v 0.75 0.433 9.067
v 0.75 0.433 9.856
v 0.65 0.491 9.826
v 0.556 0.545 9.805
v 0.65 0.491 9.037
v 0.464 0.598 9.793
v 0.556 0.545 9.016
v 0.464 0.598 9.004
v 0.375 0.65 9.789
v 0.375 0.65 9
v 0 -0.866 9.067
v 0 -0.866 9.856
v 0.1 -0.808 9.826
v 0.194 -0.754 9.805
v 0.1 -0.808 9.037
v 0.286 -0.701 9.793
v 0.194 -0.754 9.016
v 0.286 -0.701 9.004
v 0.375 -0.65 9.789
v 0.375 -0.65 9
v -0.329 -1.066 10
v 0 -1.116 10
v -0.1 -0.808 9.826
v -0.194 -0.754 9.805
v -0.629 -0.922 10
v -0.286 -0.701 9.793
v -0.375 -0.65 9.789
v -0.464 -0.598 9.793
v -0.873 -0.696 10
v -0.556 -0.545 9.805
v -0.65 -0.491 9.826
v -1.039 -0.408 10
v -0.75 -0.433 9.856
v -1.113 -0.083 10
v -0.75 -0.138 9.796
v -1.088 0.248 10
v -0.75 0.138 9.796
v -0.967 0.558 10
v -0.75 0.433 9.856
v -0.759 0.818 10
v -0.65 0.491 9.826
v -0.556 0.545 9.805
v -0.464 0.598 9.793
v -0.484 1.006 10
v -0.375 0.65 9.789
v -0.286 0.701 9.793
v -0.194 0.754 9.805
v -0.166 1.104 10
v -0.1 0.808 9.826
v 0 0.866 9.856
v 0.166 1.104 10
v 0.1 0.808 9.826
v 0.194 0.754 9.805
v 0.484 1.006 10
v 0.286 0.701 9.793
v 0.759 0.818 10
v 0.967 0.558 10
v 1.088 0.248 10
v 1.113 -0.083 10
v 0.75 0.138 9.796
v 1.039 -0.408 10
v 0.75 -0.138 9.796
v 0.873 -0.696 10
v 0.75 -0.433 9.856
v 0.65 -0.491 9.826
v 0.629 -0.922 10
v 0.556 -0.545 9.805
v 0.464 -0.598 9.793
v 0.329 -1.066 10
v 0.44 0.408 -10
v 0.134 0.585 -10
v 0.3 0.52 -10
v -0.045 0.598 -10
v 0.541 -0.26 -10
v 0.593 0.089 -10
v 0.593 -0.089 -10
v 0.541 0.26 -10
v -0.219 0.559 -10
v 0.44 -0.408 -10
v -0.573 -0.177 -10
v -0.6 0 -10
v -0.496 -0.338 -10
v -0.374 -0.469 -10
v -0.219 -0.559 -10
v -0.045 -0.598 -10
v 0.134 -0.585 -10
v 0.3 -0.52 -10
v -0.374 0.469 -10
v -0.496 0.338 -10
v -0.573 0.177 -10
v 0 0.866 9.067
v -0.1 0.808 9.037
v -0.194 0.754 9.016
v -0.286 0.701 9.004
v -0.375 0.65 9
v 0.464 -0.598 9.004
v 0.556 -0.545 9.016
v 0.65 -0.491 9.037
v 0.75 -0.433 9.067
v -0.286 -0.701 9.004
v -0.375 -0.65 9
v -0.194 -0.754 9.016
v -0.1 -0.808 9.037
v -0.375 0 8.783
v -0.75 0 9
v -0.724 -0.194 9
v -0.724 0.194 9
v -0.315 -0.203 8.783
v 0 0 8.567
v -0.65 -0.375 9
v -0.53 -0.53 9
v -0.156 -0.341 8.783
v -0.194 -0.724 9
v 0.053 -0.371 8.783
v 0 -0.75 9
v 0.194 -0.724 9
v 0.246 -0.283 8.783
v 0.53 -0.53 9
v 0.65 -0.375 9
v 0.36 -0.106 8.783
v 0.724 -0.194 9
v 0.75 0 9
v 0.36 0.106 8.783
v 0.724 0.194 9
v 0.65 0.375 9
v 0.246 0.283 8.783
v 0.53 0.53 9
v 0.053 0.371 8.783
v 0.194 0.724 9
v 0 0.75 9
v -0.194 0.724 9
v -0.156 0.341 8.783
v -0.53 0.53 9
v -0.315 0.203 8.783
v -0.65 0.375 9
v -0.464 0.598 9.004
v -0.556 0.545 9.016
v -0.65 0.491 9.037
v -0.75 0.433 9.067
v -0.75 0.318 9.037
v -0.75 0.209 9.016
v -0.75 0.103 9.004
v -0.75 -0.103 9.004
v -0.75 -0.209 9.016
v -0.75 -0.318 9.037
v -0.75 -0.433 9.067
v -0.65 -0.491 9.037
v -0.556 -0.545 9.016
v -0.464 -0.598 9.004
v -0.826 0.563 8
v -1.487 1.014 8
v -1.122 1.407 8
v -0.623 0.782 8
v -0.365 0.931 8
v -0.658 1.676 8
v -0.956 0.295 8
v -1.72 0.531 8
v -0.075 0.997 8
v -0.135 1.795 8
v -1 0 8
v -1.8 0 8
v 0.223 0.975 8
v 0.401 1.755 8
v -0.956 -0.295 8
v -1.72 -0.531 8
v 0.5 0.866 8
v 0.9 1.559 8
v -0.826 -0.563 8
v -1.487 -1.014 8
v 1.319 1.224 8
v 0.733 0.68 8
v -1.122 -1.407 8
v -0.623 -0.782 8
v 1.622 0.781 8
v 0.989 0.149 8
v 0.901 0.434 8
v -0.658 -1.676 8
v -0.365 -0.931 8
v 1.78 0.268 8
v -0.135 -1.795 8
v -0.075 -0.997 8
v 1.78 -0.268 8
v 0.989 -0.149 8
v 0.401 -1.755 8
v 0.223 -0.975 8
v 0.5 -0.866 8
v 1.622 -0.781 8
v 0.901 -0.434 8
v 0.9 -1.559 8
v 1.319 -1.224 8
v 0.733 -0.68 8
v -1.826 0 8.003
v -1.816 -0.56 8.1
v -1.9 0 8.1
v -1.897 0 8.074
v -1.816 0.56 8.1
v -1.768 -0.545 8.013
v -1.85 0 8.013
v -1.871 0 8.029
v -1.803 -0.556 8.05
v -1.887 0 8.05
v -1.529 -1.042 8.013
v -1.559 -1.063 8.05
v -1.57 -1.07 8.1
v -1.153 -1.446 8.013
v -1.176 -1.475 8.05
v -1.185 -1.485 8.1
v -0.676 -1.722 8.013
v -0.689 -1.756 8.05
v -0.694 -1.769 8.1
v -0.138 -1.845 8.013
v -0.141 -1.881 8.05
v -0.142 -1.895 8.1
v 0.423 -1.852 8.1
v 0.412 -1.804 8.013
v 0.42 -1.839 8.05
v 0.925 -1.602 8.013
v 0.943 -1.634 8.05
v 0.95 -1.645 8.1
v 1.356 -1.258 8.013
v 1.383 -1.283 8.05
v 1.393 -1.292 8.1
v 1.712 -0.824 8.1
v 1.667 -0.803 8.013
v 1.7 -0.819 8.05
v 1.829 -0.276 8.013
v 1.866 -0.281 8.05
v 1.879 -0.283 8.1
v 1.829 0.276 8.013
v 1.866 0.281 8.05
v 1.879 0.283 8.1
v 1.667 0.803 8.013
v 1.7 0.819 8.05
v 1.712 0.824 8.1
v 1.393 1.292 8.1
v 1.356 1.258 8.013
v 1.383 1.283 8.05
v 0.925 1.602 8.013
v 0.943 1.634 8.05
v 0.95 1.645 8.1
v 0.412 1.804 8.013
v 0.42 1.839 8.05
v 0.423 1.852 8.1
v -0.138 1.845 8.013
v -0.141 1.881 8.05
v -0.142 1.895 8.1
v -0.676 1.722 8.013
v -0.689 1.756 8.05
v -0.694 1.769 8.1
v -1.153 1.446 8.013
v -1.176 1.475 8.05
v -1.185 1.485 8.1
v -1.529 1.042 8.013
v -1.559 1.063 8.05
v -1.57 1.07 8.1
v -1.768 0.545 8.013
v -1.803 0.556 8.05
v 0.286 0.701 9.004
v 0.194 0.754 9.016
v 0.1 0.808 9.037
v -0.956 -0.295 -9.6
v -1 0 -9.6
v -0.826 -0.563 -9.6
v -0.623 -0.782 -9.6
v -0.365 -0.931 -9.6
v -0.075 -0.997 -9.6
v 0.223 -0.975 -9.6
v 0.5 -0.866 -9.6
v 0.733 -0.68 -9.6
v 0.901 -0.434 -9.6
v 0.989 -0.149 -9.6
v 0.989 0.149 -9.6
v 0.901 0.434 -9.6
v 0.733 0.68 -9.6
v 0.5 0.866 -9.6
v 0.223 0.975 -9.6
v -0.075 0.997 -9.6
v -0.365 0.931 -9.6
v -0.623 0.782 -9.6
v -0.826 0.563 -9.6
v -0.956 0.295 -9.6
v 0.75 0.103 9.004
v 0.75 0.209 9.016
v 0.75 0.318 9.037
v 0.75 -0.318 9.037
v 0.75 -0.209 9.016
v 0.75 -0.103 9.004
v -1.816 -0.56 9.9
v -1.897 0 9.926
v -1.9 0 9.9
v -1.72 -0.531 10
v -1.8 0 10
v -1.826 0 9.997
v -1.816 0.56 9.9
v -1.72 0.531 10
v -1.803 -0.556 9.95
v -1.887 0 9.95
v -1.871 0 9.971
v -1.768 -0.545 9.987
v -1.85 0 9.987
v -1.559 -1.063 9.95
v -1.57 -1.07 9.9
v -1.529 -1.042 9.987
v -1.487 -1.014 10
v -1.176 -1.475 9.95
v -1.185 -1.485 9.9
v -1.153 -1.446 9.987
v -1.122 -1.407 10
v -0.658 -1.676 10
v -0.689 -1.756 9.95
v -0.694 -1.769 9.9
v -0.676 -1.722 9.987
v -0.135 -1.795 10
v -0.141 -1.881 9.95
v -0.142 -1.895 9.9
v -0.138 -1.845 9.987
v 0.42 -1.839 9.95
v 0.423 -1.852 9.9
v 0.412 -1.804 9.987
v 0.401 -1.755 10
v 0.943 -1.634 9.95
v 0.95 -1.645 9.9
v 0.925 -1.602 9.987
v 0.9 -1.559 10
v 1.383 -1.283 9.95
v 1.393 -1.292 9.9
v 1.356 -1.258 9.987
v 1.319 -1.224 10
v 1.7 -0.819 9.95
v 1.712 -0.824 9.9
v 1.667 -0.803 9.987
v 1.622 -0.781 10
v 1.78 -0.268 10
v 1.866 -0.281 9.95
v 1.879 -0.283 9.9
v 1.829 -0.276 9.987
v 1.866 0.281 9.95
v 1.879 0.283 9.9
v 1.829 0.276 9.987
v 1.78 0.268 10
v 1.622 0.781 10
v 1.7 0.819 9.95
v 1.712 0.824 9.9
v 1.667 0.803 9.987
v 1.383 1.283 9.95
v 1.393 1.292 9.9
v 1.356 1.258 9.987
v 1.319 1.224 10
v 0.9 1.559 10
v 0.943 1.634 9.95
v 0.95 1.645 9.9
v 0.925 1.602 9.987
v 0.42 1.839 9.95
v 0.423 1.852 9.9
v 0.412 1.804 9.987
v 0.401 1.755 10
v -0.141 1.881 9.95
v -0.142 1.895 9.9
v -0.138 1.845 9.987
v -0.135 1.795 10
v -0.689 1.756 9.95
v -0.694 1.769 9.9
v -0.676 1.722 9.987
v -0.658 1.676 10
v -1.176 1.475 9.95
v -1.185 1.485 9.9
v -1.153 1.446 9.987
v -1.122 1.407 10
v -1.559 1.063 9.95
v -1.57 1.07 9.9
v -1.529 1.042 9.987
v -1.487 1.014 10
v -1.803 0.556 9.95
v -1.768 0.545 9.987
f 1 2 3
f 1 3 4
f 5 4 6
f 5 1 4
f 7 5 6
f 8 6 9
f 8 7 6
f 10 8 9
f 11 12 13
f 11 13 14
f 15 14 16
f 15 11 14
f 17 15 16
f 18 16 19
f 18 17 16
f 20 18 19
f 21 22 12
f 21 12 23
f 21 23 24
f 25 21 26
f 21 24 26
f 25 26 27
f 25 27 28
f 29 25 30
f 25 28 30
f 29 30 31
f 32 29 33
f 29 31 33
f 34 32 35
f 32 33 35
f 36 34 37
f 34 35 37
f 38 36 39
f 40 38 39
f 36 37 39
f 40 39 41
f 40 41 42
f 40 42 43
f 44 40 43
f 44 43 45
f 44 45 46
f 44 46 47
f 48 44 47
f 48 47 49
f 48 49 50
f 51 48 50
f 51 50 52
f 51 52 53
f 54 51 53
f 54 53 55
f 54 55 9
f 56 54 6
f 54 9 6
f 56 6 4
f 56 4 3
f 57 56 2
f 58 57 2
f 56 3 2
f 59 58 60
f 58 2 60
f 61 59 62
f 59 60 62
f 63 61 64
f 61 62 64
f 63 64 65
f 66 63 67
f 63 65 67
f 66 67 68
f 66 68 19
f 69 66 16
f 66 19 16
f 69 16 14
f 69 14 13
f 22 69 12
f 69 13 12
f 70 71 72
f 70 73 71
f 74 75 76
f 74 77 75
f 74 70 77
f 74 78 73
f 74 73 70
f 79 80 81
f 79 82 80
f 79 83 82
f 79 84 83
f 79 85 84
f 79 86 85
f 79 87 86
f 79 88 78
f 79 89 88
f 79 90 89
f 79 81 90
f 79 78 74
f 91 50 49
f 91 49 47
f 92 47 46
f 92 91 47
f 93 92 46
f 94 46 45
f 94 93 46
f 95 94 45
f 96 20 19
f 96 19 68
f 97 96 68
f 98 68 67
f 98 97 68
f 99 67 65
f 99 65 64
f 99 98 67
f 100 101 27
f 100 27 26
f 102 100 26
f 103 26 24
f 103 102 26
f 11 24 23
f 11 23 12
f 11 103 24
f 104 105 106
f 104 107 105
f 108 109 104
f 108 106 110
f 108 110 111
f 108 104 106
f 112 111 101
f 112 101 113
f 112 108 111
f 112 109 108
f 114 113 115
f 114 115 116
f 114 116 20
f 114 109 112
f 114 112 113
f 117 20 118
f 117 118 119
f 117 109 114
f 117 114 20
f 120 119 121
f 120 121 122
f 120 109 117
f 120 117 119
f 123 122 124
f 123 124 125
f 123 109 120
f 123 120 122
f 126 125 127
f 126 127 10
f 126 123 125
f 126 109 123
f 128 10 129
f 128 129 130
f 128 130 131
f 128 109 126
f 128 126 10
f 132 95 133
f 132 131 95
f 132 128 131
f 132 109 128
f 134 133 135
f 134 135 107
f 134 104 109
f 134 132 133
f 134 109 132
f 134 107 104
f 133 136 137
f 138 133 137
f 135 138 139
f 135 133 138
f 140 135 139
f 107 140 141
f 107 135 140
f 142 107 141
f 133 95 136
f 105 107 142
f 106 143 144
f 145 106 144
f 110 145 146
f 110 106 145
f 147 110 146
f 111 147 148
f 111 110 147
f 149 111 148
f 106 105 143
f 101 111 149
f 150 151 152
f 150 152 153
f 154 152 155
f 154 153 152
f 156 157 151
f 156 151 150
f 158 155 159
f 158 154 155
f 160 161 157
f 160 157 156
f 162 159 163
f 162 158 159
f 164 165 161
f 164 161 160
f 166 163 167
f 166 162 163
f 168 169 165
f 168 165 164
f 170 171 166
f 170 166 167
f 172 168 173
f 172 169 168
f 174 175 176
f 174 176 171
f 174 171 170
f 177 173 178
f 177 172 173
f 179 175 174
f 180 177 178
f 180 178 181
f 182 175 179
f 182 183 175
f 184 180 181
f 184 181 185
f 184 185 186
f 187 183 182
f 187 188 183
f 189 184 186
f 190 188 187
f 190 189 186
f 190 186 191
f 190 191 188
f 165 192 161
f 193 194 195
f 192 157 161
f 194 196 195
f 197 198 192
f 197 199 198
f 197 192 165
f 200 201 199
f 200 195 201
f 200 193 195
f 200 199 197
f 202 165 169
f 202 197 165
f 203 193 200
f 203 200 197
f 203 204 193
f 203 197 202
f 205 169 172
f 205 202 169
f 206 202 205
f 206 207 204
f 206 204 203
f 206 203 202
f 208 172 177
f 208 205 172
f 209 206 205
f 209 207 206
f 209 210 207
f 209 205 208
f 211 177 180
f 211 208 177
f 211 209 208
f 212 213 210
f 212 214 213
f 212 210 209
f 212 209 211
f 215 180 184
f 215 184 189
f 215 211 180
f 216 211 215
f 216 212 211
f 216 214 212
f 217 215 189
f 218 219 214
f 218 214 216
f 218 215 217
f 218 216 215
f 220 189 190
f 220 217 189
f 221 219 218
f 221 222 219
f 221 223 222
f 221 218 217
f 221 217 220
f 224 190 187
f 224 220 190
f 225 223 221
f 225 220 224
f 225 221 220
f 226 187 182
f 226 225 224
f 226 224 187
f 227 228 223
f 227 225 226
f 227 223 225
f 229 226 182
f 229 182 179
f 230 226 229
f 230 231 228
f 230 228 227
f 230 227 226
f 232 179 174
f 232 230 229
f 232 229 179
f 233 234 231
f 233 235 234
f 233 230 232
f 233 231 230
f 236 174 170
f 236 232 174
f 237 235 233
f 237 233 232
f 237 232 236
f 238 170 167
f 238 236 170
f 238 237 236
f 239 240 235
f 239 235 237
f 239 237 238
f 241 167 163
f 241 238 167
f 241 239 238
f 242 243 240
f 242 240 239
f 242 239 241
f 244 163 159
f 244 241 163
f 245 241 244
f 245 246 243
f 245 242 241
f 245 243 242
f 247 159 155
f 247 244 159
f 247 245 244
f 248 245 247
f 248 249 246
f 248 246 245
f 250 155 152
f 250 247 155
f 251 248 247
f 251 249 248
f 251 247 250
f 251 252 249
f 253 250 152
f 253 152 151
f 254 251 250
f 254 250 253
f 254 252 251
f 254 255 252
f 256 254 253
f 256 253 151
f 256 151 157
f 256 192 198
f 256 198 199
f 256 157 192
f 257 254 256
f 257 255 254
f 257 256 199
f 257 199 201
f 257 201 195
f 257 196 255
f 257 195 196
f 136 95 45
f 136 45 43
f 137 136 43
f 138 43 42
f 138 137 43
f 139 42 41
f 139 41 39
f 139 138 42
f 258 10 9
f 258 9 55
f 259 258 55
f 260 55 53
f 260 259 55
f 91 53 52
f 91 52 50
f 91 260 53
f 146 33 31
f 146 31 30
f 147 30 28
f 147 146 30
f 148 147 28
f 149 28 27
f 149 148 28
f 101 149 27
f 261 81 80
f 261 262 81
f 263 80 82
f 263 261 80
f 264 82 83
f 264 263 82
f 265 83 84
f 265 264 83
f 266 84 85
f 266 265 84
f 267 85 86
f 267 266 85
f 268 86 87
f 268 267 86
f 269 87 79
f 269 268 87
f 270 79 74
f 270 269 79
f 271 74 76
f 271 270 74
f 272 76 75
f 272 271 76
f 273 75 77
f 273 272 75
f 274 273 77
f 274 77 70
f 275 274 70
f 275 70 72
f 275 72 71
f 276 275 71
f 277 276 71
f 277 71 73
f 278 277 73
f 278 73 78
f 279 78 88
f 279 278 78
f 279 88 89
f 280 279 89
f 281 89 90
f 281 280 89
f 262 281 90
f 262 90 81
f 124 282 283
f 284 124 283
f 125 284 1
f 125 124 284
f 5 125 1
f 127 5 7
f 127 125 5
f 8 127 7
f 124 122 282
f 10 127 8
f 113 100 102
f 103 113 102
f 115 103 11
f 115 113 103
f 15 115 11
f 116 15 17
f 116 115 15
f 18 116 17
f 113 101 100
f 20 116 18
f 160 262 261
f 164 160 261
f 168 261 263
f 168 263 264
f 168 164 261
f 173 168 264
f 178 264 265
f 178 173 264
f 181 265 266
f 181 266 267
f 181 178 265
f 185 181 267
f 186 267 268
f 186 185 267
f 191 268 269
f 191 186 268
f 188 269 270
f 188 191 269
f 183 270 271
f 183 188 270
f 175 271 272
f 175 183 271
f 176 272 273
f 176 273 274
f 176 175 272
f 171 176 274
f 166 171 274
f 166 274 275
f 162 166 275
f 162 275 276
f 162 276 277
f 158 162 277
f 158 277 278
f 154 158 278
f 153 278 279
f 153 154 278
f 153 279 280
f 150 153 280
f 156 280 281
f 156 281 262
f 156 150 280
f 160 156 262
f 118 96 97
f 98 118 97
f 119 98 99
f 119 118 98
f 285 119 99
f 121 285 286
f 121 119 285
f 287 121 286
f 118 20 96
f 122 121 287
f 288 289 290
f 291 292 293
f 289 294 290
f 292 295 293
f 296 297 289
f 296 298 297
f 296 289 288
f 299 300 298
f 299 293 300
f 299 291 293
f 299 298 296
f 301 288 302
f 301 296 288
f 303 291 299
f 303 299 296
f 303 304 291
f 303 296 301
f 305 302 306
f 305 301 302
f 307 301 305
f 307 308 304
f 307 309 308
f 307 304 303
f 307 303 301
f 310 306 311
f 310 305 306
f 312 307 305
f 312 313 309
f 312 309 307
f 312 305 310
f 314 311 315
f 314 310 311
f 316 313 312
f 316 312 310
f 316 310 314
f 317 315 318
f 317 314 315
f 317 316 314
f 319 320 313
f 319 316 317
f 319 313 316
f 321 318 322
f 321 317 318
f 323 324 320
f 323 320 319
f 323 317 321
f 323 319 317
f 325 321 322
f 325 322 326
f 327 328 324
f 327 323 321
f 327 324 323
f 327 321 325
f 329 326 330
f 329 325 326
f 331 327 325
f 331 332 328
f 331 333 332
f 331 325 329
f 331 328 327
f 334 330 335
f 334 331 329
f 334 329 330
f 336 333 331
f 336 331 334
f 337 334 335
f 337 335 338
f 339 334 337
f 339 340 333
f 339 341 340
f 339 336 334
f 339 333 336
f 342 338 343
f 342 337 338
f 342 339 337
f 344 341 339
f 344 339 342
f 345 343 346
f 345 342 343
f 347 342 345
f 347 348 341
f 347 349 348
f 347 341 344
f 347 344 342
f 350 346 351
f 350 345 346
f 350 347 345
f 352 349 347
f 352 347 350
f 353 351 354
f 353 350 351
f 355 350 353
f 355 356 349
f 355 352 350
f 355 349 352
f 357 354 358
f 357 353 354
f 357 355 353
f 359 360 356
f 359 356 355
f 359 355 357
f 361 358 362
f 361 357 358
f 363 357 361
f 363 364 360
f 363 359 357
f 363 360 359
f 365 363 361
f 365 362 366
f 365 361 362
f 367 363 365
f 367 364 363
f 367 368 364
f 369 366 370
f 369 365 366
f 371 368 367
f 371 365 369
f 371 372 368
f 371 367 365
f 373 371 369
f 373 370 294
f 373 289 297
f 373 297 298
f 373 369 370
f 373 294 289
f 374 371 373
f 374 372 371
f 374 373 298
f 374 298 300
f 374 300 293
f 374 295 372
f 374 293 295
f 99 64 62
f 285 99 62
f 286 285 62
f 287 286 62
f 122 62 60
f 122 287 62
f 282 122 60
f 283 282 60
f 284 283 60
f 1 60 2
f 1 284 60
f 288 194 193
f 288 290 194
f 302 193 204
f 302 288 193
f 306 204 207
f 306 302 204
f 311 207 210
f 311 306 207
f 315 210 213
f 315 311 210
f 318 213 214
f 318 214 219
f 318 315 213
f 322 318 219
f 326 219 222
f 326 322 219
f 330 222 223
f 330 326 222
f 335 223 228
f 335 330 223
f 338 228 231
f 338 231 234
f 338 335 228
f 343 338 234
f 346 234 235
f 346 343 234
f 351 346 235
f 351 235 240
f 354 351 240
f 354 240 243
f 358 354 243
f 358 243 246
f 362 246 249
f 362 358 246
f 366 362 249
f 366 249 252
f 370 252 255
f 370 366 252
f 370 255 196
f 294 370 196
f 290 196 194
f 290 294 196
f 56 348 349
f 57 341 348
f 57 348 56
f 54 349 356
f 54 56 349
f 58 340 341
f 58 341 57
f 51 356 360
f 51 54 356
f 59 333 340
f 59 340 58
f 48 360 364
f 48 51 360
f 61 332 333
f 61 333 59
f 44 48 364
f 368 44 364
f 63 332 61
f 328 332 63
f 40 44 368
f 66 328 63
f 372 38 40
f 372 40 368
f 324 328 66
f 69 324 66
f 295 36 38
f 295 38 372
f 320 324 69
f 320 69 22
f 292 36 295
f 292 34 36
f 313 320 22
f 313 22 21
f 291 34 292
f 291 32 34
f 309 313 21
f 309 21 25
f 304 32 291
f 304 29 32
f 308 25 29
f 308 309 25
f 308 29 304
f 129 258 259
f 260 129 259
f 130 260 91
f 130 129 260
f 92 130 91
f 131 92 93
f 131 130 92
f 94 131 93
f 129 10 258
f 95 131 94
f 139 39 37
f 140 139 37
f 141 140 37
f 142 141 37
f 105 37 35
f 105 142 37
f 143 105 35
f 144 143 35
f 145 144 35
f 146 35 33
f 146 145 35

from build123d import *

# Parameters (mm, degrees)
CUT_EXTRUDE1_REACH = 22.355
CUT_EXTRUDE1_START = 10


with BuildPart() as part:
    # Sketch2 → Revolve1 (revolve)
    with BuildSketch(Plane(origin=(0, 0, 0), x_dir=(0, 0, -1), z_dir=(1, 0, 0))):
        with BuildLine():
            Line((10, 0), (10, 0.6))
            Line((10, 0.6), (9.6, 1))
            Line((9.6, 1), (-8, 1))
            Line((-8, 1), (-8, 1.8))
            ThreePointArc((-8, 1.8), (-8.029289322, 1.870710678), (-8.1, 1.9))
            Line((-8.1, 1.9), (-9.9, 1.9))
            ThreePointArc((-9.9, 1.9), (-9.970710678, 1.870710678), (-10, 1.8))
            Line((-10, 1.8), (-10, 0.75))
            Line((-10, 0.75), (-9, 0.75))
            Line((-9, 0.75), (-8.566987298, 0))
            Line((-8.566987298, 0), (10, 0))
        make_face()
    revolve(axis=Axis((0, 0, -10), (0, 0, 1)))

    # Cut-Extrude1: up to this cone (the profile starts inside it)
    cut_extrude1_end = Plane(origin=(0, 0, 10), z_dir=(0, 0, 1)).offset(-1.433011702) * Cone(1.732e-06, 46.36711012, 26.770062509, align=(Align.CENTER, Align.CENTER, Align.MIN), mode=Mode.PRIVATE)
    # Sketch3 → Cut-Extrude1 (cut, up to the surface)
    with BuildSketch(Plane.XY.offset(CUT_EXTRUDE1_START), mode=Mode.PRIVATE) as cut_extrude1_sk1:
        Polygon((-0.75, 0.433012702), (-0.75, -0.433012702), (0, -0.866025404), (0.75, -0.433012702), (0.75, 0.433012702), (0, 0.866025404), align=None)
    cut_extrude1_tool1 = extrude(cut_extrude1_sk1.sketch, amount=-CUT_EXTRUDE1_REACH, mode=Mode.PRIVATE) & cut_extrude1_end
    add(cut_extrude1_tool1.solids().sort_by_distance((0, 0, 10))[0], mode=Mode.SUBTRACT)

    # Cut-Extrude2 cone 1 section (through the dimple's axis) → Cut-Extrude2 (revolve, cut)
    with BuildSketch(Plane(origin=(0, 0, 10), x_dir=(0, -1, 0), z_dir=(1, 0, 0))):
        Polygon((0, 0), (1.116025404, 0), (0, 0.644337567), align=None)
    revolve(axis=Axis((0, 0, 10), (0, 0, -1)), mode=Mode.SUBTRACT)


solid = part.part
